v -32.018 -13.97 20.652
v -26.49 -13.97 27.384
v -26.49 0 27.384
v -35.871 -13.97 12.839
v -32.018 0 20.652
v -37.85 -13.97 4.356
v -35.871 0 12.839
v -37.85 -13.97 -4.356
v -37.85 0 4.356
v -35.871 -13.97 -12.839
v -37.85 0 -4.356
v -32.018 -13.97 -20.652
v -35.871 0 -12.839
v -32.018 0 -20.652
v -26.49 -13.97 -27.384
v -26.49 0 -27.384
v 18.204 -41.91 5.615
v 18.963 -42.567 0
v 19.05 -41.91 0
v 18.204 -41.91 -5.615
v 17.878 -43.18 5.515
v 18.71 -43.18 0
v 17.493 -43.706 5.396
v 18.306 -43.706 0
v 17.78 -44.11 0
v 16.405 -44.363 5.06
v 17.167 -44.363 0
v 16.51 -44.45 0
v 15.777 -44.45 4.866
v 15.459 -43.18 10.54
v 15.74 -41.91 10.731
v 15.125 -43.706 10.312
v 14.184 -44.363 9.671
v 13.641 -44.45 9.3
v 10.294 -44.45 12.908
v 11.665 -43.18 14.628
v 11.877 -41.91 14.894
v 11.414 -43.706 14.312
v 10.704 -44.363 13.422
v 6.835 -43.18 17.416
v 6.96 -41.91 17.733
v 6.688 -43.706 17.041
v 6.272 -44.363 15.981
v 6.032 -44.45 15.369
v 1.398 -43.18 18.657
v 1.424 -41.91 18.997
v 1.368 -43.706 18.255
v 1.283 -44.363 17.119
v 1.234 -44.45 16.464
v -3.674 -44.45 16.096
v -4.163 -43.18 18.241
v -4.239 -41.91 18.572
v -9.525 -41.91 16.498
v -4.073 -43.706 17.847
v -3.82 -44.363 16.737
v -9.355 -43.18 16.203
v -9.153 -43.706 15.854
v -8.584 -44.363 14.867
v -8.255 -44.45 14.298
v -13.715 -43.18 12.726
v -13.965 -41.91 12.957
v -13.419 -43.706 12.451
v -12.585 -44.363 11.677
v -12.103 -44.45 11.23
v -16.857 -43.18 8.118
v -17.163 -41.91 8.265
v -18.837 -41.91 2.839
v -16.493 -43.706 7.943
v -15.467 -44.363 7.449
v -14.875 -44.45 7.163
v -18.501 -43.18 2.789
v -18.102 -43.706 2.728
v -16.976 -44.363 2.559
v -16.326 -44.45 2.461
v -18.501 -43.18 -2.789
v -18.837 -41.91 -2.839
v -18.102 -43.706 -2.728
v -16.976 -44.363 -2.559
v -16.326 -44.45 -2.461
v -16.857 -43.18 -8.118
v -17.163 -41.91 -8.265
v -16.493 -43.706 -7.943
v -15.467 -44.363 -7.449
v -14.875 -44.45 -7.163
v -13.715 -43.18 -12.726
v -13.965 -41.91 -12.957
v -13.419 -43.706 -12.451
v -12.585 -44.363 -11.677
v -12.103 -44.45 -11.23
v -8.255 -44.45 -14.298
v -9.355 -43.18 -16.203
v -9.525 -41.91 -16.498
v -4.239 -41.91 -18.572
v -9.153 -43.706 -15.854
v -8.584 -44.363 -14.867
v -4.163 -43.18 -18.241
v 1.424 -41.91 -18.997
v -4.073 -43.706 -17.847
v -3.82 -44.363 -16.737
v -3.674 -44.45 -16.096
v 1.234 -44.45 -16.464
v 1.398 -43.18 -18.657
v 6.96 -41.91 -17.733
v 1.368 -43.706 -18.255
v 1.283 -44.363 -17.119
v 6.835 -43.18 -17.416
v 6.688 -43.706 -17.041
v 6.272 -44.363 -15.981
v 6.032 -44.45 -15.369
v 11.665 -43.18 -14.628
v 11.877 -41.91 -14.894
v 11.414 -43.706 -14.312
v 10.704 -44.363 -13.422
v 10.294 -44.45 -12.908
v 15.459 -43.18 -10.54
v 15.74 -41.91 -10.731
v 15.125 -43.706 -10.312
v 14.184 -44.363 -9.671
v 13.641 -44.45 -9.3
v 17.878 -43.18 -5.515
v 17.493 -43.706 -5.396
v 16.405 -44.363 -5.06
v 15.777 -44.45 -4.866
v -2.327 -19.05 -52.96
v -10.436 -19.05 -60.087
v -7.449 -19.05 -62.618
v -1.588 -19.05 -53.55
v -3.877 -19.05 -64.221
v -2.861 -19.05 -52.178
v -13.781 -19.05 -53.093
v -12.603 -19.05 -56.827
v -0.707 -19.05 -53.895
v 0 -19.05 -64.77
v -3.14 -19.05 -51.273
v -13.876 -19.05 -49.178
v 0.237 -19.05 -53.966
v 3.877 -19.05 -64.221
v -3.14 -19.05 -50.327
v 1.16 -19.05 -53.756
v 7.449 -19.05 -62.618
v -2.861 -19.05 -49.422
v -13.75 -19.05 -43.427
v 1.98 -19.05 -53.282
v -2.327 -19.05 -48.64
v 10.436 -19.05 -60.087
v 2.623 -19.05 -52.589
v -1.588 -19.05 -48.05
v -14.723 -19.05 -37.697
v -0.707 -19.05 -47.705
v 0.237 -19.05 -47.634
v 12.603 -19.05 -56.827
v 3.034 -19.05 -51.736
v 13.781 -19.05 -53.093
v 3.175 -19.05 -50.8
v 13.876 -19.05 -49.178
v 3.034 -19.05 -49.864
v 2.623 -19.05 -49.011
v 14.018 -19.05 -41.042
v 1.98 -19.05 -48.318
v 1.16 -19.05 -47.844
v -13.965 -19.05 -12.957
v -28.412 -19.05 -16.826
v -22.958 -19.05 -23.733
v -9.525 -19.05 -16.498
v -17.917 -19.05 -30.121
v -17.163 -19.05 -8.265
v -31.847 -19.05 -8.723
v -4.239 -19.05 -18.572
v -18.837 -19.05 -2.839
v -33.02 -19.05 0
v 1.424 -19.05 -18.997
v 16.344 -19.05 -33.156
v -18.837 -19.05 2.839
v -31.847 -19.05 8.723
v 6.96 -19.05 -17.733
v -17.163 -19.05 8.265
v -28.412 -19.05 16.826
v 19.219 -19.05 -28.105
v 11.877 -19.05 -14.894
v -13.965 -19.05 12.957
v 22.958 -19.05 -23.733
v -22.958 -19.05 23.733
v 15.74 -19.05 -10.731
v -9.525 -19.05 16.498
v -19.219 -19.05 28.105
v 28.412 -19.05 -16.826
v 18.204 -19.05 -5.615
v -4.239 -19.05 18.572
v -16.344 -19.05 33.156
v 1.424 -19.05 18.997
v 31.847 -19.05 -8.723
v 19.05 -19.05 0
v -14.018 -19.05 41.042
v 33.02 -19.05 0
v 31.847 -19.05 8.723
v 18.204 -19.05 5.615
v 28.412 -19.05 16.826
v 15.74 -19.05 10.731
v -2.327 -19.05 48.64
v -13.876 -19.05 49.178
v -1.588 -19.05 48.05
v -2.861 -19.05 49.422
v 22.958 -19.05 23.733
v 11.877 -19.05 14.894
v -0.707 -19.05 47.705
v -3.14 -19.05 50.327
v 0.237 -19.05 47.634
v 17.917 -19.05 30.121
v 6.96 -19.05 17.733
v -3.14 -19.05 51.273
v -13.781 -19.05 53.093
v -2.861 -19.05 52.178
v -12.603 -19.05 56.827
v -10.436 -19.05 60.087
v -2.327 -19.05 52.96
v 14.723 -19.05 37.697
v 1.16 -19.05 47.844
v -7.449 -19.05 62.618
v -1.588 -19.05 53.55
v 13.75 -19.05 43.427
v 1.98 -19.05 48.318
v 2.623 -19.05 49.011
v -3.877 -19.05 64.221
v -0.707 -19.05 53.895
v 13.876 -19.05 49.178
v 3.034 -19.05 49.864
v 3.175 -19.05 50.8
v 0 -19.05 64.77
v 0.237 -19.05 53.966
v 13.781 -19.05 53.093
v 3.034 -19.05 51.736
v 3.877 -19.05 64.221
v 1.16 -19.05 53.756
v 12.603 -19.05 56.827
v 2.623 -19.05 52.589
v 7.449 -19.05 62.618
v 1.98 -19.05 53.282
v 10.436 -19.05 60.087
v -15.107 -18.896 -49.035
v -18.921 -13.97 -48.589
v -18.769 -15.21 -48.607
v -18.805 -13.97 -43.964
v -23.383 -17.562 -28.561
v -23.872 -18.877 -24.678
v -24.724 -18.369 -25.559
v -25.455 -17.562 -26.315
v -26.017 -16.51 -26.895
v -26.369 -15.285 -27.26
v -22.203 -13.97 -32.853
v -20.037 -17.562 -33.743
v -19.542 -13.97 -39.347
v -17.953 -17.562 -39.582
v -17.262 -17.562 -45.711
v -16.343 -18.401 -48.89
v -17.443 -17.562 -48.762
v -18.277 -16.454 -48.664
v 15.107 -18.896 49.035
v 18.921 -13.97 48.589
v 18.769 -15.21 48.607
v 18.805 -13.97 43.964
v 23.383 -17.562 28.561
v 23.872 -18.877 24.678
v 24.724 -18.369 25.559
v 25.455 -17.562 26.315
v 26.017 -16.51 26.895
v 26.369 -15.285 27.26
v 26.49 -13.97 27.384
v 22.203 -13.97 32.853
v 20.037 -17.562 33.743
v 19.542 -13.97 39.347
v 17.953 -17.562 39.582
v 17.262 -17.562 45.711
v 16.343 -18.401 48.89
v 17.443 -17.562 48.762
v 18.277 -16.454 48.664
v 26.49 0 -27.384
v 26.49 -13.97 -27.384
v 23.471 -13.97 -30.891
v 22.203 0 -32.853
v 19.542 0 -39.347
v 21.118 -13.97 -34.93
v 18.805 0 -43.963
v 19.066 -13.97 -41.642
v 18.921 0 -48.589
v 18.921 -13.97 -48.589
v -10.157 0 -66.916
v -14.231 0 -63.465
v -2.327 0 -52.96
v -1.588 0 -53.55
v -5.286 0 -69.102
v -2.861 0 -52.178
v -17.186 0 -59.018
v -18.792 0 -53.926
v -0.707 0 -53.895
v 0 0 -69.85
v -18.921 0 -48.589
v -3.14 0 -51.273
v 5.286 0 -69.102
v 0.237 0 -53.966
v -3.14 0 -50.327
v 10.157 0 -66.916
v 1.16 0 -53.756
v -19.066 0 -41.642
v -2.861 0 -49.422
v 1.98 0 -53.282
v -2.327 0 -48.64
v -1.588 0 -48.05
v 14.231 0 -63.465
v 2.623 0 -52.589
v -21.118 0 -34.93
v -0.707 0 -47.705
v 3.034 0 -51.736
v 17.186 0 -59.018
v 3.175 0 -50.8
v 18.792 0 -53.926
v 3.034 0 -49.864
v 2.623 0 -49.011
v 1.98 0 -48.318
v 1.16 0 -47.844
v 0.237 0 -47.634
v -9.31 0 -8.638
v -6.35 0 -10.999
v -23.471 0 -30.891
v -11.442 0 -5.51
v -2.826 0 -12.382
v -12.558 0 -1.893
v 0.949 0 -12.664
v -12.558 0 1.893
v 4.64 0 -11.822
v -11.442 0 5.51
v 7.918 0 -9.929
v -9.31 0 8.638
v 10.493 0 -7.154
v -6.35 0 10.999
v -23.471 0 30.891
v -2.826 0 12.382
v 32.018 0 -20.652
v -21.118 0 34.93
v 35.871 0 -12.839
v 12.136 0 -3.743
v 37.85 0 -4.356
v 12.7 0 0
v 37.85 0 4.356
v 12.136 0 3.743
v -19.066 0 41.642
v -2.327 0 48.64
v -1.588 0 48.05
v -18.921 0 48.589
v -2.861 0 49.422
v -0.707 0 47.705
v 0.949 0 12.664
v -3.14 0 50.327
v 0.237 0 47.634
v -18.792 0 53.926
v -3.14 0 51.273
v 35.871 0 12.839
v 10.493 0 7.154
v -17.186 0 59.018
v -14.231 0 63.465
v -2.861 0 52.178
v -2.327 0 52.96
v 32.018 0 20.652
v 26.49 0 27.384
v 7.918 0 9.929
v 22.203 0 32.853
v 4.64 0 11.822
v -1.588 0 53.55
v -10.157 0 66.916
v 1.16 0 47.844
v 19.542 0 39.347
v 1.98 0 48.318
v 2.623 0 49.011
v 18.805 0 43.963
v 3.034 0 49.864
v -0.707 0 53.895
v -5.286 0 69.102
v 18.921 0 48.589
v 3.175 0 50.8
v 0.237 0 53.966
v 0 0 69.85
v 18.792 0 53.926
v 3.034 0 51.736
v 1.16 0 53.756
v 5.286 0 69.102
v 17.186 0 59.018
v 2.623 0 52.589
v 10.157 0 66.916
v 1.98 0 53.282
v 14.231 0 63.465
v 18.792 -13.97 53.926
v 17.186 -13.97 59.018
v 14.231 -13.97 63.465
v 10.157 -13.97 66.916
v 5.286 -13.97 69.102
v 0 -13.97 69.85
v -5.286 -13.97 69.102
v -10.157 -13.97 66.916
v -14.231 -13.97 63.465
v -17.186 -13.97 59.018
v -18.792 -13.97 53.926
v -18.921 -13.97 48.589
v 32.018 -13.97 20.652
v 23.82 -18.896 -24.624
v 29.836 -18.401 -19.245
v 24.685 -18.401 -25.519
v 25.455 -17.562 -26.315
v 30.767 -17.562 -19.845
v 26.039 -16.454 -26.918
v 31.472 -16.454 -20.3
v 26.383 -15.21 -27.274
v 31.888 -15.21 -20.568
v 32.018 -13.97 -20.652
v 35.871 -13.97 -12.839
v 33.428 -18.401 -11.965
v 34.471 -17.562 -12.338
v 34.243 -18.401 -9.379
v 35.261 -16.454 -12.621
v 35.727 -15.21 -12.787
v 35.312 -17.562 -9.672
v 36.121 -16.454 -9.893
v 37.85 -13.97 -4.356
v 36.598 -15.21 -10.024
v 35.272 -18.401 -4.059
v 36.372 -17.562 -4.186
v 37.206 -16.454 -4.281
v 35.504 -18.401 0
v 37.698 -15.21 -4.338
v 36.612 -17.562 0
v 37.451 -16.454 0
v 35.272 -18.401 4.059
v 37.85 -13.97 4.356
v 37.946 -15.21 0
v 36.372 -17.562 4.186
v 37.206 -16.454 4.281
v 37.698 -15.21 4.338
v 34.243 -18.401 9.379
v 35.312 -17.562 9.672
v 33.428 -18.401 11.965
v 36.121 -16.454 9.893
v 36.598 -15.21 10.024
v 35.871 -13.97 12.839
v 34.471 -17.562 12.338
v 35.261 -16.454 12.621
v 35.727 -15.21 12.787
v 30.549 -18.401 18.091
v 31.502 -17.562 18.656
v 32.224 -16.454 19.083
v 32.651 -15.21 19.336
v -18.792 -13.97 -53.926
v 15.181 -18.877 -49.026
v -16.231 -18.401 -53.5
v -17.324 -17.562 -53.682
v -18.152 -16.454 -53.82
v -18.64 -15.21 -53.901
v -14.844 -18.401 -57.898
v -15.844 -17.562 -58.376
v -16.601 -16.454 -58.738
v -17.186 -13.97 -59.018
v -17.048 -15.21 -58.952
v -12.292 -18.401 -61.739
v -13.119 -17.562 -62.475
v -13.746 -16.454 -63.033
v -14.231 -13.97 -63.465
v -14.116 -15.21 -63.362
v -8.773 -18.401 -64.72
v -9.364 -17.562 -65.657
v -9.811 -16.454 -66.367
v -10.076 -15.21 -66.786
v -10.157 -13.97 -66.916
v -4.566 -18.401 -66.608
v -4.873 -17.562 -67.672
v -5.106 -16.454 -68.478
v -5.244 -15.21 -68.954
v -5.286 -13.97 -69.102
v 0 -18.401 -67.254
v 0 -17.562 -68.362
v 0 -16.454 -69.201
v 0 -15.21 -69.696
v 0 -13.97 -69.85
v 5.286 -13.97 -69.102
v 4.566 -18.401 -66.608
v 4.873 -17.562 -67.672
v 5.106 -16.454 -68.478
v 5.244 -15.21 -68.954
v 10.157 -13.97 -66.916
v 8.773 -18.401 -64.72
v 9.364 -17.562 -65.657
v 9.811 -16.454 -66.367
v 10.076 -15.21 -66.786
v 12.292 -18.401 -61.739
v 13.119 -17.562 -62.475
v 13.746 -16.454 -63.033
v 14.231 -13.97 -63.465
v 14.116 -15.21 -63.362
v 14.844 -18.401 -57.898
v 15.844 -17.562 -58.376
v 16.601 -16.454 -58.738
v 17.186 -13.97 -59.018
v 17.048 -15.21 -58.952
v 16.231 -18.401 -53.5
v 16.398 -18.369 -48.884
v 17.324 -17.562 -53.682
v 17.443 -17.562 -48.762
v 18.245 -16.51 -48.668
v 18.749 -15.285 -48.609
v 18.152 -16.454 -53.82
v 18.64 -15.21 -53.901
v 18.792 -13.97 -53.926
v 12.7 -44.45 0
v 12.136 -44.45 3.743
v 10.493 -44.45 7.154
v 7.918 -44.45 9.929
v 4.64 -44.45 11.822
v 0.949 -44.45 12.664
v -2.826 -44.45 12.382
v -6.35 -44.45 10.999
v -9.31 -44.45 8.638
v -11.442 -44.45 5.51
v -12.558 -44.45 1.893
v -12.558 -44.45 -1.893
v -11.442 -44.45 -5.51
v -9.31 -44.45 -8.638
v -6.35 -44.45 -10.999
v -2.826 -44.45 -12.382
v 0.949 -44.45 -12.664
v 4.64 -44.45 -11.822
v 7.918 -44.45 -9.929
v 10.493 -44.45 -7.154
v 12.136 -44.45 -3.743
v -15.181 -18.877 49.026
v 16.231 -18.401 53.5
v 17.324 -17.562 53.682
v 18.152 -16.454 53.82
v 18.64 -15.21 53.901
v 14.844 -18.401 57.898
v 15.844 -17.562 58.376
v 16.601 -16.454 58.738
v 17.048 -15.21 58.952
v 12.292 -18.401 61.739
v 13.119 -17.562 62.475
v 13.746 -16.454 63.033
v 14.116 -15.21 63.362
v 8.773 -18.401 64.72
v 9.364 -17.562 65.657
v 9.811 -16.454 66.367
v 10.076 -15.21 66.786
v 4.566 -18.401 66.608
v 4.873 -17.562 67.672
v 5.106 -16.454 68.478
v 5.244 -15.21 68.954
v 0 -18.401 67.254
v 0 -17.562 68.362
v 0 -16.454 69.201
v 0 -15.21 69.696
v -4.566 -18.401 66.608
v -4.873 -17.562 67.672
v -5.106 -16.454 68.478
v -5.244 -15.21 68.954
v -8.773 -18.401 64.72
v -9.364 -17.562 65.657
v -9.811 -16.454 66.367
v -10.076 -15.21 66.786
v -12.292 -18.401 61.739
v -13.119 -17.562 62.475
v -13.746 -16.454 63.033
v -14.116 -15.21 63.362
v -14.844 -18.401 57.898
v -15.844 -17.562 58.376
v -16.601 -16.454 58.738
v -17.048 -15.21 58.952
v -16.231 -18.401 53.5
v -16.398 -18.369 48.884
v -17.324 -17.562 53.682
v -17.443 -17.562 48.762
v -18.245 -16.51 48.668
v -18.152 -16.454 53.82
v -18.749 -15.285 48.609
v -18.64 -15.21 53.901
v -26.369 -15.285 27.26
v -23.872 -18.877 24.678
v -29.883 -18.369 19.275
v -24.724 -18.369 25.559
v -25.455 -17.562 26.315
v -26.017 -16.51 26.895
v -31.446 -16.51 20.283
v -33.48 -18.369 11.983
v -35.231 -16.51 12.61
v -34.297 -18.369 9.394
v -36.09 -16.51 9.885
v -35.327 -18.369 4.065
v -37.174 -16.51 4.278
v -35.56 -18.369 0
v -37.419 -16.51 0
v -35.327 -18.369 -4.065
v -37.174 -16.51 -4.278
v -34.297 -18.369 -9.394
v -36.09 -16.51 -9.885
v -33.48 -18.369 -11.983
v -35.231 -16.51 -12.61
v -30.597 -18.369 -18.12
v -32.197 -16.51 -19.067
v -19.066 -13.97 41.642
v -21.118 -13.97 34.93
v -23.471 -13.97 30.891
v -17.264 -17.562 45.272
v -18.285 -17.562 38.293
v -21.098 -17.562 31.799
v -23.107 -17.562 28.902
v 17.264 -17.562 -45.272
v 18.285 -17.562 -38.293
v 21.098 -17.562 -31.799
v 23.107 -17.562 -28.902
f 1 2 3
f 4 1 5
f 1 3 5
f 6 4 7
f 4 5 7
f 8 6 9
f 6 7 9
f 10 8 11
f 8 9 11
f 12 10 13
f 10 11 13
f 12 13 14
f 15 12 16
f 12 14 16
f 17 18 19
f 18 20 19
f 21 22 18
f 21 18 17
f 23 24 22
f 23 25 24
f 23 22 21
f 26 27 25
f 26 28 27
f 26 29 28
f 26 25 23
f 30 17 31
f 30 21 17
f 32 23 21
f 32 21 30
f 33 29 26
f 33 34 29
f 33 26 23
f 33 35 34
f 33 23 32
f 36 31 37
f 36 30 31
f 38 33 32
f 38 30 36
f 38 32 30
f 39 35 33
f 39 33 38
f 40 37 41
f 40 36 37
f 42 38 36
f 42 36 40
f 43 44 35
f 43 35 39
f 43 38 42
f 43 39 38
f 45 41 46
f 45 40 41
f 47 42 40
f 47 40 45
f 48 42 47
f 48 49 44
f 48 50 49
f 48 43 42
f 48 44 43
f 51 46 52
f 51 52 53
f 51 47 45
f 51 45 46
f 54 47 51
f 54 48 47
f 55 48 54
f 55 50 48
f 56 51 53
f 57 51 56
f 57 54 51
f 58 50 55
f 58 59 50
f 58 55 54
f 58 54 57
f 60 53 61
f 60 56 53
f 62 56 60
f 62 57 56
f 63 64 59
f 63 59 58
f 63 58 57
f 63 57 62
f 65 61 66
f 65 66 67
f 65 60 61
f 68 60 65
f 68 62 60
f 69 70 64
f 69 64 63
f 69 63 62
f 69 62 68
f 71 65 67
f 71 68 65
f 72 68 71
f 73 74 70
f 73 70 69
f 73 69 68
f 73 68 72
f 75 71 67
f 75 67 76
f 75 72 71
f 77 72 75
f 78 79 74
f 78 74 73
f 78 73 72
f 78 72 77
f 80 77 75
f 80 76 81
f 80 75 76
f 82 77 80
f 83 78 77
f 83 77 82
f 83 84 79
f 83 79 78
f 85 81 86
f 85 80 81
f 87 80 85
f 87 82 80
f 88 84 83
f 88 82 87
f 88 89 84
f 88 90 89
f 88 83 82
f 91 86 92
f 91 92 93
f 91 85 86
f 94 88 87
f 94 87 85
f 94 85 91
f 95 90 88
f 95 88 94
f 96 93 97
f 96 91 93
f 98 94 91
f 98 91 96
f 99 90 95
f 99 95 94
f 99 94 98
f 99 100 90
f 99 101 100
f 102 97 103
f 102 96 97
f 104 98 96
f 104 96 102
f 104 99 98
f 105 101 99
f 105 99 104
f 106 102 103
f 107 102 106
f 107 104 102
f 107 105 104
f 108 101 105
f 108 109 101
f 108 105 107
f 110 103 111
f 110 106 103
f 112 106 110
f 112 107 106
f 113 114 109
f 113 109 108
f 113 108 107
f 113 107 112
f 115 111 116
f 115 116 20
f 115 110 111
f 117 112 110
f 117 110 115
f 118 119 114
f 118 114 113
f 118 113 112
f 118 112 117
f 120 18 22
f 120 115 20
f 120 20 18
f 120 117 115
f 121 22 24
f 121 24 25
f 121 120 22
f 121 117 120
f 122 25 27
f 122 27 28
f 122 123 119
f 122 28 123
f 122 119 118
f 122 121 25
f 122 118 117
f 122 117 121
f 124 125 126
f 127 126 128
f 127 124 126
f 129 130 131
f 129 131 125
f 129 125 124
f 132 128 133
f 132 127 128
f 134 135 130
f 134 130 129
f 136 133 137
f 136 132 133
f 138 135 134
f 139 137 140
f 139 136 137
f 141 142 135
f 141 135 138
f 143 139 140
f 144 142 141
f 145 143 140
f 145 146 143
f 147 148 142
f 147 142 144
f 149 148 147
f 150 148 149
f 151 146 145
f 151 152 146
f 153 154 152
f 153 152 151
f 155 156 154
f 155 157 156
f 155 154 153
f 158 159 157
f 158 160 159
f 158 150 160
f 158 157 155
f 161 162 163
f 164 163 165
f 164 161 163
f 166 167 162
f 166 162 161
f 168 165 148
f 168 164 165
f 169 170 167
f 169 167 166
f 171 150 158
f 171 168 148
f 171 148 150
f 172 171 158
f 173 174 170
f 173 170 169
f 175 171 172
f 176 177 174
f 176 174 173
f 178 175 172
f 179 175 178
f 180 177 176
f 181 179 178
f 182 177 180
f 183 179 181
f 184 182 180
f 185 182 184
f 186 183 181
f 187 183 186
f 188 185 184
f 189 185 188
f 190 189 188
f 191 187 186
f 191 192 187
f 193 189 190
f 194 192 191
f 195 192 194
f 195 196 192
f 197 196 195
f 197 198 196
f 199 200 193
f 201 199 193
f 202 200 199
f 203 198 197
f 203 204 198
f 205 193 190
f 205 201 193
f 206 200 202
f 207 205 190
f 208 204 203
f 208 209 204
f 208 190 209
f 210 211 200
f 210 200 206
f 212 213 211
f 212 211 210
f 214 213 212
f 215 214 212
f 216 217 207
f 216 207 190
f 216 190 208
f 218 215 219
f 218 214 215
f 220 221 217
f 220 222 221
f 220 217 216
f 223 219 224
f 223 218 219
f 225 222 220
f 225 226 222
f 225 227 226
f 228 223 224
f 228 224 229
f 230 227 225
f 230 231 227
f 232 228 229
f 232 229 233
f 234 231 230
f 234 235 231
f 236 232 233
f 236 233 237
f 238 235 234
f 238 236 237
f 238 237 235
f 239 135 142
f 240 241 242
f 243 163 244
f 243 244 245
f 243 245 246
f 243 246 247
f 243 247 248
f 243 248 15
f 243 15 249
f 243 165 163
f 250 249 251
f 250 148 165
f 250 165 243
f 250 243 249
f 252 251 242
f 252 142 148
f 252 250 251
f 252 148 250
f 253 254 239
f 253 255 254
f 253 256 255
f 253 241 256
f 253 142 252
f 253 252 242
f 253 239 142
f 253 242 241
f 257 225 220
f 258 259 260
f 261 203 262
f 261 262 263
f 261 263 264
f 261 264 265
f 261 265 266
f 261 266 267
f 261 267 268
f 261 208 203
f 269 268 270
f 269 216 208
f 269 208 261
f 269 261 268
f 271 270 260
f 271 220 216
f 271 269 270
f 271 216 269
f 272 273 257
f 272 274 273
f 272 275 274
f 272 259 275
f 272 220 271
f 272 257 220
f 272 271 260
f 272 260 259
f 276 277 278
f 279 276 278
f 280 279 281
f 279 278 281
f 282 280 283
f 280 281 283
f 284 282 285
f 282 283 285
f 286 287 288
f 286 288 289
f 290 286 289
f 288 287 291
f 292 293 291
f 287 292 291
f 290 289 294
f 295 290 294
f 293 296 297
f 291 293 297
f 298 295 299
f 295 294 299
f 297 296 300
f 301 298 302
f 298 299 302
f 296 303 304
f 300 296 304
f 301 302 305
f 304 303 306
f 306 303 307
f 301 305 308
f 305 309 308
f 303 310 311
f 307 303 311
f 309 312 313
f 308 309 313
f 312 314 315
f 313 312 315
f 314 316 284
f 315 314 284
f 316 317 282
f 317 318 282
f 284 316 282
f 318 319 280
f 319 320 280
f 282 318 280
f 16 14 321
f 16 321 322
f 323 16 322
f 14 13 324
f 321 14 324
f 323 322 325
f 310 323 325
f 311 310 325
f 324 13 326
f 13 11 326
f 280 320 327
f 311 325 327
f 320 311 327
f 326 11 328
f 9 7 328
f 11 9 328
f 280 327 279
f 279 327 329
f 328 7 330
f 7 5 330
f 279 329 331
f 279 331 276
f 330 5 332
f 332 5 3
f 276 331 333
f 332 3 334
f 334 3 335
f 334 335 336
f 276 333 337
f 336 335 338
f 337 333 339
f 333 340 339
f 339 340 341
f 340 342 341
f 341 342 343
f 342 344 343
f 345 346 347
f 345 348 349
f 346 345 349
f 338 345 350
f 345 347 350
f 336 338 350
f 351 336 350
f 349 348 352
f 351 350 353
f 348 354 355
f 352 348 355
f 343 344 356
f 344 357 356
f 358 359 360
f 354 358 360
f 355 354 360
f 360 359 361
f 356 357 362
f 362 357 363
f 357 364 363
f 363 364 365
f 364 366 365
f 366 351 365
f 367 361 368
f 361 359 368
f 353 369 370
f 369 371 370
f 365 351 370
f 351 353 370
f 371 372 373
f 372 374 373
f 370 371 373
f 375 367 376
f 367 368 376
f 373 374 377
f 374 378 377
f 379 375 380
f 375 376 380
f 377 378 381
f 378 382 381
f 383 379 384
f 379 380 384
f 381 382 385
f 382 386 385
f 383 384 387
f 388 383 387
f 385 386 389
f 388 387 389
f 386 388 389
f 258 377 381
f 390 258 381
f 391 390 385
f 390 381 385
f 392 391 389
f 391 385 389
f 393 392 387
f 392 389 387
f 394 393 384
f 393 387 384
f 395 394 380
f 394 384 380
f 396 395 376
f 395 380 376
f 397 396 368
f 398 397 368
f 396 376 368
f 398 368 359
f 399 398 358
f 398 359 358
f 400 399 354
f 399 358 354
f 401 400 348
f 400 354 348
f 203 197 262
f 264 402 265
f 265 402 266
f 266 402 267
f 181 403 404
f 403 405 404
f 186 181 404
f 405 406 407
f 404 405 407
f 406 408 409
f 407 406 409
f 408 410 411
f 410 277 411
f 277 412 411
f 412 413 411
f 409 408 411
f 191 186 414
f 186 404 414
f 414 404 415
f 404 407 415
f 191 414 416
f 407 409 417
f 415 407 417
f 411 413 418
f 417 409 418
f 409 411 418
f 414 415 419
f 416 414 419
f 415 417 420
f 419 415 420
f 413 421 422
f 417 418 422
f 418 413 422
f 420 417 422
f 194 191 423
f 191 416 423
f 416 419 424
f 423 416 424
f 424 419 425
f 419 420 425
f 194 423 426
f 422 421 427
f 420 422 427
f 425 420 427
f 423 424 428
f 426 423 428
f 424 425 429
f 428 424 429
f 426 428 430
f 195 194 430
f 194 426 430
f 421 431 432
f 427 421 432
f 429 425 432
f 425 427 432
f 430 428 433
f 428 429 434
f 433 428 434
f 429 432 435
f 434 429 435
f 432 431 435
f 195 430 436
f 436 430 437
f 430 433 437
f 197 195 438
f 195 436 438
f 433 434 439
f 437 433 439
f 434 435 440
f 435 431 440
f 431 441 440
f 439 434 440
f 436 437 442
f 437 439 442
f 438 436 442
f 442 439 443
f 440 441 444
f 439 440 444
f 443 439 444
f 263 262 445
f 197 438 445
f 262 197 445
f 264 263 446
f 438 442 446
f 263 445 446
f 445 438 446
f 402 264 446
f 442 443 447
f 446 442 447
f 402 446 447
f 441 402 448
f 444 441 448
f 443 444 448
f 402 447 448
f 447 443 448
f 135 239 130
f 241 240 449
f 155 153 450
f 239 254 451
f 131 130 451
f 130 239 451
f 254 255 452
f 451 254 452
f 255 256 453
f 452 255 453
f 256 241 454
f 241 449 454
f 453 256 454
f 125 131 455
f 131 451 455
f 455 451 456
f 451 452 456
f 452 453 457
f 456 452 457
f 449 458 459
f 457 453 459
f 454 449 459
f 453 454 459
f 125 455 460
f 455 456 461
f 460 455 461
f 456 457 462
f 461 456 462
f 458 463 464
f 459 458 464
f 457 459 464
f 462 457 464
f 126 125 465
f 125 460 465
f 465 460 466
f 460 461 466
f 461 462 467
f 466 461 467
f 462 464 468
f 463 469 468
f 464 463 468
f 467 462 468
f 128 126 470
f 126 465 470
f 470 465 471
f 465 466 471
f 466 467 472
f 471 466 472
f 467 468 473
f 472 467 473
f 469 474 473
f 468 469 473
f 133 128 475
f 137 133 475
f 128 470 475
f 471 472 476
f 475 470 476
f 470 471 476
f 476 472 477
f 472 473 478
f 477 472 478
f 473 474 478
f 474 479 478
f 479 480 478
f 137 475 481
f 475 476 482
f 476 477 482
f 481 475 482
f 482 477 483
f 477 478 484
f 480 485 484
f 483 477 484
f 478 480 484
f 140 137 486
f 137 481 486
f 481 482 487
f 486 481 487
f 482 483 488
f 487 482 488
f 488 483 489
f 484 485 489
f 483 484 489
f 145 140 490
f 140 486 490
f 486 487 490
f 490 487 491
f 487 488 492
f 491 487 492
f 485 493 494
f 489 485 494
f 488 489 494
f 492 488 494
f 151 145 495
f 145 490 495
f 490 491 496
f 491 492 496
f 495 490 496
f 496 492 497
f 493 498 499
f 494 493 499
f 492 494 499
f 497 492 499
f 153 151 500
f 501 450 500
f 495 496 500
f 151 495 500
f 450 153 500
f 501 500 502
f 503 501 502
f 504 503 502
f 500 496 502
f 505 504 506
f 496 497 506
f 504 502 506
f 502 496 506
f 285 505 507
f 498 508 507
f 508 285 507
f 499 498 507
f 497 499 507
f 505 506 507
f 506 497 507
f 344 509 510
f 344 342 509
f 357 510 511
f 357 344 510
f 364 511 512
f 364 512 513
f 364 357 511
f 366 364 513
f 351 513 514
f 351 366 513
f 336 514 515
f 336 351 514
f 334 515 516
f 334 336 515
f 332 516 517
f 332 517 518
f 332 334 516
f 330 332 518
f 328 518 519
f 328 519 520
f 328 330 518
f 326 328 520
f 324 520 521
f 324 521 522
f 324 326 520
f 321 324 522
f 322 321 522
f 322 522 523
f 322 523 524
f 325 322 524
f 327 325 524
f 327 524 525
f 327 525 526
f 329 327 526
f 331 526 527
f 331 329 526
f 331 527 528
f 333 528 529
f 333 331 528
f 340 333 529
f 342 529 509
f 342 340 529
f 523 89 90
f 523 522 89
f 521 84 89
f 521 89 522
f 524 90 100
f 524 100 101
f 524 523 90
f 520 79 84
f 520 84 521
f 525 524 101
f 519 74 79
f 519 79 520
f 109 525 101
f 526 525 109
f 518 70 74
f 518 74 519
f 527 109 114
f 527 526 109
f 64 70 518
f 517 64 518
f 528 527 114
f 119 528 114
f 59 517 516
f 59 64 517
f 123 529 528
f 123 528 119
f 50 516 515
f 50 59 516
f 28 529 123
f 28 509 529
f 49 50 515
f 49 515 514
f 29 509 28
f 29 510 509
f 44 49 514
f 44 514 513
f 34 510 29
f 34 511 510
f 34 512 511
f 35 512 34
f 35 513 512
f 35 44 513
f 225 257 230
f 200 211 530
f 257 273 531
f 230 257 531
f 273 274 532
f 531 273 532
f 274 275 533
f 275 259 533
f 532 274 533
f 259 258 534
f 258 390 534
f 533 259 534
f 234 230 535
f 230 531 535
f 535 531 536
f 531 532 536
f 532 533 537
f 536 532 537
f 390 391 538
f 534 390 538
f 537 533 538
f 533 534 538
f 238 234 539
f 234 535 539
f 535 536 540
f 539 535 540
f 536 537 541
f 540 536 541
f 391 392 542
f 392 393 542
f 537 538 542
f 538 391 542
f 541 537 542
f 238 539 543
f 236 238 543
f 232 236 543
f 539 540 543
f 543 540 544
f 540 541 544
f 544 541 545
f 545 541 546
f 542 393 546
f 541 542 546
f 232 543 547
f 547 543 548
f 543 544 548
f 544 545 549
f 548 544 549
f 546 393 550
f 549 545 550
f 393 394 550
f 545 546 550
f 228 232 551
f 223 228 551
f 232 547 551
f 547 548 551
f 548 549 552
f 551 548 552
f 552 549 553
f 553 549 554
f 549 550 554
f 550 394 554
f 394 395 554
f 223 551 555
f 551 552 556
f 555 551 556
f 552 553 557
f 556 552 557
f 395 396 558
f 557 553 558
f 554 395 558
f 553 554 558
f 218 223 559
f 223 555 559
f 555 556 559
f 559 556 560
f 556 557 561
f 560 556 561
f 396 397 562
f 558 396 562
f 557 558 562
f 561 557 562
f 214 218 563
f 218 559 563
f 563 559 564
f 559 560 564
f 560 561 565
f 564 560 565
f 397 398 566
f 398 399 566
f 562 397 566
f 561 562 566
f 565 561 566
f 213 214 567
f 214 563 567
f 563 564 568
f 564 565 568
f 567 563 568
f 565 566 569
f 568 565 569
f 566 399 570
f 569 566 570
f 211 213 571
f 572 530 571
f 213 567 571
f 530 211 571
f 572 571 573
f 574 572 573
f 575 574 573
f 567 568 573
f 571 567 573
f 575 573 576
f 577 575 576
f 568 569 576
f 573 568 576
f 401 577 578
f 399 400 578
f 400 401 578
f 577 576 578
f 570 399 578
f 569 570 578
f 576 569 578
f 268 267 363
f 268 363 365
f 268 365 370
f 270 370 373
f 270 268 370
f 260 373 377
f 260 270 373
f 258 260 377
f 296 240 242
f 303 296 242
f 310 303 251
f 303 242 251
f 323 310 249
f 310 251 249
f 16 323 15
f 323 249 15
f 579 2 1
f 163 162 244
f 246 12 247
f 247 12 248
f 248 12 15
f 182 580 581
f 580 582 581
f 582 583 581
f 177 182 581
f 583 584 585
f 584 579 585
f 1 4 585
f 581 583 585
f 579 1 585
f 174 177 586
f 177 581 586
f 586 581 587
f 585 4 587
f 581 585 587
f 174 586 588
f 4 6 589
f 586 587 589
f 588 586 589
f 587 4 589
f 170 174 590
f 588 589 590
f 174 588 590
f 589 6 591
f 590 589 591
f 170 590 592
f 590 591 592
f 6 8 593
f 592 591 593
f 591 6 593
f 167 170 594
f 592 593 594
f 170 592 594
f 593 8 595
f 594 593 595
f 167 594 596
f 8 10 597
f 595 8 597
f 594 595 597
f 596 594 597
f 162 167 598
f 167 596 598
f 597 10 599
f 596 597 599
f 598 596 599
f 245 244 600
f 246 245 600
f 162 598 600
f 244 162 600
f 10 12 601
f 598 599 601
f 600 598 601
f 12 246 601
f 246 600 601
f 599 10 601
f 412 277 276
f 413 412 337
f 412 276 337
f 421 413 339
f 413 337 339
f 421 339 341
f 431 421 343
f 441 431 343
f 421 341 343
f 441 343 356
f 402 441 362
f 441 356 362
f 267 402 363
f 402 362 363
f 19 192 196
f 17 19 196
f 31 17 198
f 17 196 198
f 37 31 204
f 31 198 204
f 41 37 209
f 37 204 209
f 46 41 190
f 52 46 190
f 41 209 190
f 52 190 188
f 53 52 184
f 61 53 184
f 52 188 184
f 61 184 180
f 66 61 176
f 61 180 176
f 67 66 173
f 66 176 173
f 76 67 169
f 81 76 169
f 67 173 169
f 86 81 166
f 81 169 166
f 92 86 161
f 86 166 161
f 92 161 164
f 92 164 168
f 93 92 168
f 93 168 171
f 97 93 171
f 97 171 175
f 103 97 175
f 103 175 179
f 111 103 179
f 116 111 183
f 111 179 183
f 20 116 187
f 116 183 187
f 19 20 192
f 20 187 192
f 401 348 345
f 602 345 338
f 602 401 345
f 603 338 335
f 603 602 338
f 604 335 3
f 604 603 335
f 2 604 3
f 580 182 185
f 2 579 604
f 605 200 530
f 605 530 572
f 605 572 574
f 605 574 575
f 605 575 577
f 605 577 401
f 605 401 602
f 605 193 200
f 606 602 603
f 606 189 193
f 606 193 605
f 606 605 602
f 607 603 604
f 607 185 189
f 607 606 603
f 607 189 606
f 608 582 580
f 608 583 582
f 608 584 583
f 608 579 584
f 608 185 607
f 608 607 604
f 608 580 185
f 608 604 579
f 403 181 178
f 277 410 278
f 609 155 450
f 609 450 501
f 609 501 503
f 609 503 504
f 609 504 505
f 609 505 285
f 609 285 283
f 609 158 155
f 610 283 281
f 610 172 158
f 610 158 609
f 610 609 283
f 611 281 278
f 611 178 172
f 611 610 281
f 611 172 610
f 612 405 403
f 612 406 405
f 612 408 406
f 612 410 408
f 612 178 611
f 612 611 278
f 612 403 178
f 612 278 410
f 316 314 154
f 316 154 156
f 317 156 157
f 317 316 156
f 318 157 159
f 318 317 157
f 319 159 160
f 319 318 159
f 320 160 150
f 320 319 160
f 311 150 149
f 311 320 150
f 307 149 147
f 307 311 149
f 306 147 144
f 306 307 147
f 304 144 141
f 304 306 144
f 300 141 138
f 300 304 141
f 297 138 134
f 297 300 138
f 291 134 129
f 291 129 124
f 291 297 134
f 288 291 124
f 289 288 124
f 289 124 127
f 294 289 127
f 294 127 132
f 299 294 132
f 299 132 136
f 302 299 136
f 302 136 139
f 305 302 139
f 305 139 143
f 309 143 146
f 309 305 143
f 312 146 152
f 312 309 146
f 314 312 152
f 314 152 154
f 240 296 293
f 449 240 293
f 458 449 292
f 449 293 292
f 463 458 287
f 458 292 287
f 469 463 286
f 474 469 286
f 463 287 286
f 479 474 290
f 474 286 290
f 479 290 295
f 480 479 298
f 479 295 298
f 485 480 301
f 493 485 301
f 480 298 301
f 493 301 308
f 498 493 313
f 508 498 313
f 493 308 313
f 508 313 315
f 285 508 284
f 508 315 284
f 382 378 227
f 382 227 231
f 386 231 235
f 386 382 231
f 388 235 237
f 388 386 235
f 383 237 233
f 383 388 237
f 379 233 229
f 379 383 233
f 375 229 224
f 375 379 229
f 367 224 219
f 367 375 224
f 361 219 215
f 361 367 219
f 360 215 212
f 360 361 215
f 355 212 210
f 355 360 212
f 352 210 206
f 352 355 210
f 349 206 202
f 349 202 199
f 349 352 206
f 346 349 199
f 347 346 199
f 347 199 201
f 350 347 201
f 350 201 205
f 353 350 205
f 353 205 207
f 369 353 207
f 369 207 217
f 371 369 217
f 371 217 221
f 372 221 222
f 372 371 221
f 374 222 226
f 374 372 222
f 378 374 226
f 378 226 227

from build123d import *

# Parameters (mm, degrees)
F0_R     = 3.175
F0_R_2   = 12.7
F1_DEPTH = 19.05
F2_R     = 25.4
F3_R     = 5.08
F4_R     = 19.05
F4_R_2   = 12.7
F5_DEPTH = 25.4
F6_R     = 2.54


with BuildPart() as f1:
    # F0 (on Front) → F1 (new body)
    with BuildSketch(Plane.XZ):
        with BuildLine():
            ThreePointArc((12.1355523508, -36.115625), (38.1, 0), (12.1355523508, 36.115625))
            ThreePointArc((12.1355523508, 36.115625), (0, 69.85), (-12.1355523508, 36.115625))
            ThreePointArc((-12.1355523508, 36.115625), (-38.1, 0), (-12.1355523508, -36.115625))
            ThreePointArc((-12.1355523508, -36.115625), (0, -69.85), (12.1355523508, -36.115625))
        make_face()
        with Locations((0, -50.8)):
            Circle(F0_R, mode=Mode.SUBTRACT)
        Circle(F0_R_2, mode=Mode.SUBTRACT)
        with Locations((0, 50.8)):
            Circle(F0_R, mode=Mode.SUBTRACT)
    extrude(amount=F1_DEPTH)

    # F2
    f2_edges = [f1.edges().sort_by_distance(p)[0] for p in [
        (12.135552, -9.525, 36.115625),
        (12.135552, -9.525, -36.115625),
        (-12.135552, -9.525, -36.115625),
        (-12.135552, -9.525, 36.115625),
    ]]
    fillet(f2_edges, radius=F2_R)

    # F3
    f3_edges = [f1.edges().sort_by_distance(p)[0] for p in [
        (-20.227695, -19.05, 37.102211),
    ]]
    fillet(f3_edges, radius=F3_R)

    # F4 (on face) → F5 (join)
    with BuildSketch(Plane.XZ.offset(19.05)):
        Circle(F4_R)
        Circle(F4_R_2, mode=Mode.SUBTRACT)
    extrude(amount=F5_DEPTH)

    # F6
    f6_edges = [f1.edges().sort_by_distance(p)[0] for p in [
        (-19.05, -44.45, 0),
    ]]
    fillet(f6_edges, radius=F6_R)


solid = f1.part
